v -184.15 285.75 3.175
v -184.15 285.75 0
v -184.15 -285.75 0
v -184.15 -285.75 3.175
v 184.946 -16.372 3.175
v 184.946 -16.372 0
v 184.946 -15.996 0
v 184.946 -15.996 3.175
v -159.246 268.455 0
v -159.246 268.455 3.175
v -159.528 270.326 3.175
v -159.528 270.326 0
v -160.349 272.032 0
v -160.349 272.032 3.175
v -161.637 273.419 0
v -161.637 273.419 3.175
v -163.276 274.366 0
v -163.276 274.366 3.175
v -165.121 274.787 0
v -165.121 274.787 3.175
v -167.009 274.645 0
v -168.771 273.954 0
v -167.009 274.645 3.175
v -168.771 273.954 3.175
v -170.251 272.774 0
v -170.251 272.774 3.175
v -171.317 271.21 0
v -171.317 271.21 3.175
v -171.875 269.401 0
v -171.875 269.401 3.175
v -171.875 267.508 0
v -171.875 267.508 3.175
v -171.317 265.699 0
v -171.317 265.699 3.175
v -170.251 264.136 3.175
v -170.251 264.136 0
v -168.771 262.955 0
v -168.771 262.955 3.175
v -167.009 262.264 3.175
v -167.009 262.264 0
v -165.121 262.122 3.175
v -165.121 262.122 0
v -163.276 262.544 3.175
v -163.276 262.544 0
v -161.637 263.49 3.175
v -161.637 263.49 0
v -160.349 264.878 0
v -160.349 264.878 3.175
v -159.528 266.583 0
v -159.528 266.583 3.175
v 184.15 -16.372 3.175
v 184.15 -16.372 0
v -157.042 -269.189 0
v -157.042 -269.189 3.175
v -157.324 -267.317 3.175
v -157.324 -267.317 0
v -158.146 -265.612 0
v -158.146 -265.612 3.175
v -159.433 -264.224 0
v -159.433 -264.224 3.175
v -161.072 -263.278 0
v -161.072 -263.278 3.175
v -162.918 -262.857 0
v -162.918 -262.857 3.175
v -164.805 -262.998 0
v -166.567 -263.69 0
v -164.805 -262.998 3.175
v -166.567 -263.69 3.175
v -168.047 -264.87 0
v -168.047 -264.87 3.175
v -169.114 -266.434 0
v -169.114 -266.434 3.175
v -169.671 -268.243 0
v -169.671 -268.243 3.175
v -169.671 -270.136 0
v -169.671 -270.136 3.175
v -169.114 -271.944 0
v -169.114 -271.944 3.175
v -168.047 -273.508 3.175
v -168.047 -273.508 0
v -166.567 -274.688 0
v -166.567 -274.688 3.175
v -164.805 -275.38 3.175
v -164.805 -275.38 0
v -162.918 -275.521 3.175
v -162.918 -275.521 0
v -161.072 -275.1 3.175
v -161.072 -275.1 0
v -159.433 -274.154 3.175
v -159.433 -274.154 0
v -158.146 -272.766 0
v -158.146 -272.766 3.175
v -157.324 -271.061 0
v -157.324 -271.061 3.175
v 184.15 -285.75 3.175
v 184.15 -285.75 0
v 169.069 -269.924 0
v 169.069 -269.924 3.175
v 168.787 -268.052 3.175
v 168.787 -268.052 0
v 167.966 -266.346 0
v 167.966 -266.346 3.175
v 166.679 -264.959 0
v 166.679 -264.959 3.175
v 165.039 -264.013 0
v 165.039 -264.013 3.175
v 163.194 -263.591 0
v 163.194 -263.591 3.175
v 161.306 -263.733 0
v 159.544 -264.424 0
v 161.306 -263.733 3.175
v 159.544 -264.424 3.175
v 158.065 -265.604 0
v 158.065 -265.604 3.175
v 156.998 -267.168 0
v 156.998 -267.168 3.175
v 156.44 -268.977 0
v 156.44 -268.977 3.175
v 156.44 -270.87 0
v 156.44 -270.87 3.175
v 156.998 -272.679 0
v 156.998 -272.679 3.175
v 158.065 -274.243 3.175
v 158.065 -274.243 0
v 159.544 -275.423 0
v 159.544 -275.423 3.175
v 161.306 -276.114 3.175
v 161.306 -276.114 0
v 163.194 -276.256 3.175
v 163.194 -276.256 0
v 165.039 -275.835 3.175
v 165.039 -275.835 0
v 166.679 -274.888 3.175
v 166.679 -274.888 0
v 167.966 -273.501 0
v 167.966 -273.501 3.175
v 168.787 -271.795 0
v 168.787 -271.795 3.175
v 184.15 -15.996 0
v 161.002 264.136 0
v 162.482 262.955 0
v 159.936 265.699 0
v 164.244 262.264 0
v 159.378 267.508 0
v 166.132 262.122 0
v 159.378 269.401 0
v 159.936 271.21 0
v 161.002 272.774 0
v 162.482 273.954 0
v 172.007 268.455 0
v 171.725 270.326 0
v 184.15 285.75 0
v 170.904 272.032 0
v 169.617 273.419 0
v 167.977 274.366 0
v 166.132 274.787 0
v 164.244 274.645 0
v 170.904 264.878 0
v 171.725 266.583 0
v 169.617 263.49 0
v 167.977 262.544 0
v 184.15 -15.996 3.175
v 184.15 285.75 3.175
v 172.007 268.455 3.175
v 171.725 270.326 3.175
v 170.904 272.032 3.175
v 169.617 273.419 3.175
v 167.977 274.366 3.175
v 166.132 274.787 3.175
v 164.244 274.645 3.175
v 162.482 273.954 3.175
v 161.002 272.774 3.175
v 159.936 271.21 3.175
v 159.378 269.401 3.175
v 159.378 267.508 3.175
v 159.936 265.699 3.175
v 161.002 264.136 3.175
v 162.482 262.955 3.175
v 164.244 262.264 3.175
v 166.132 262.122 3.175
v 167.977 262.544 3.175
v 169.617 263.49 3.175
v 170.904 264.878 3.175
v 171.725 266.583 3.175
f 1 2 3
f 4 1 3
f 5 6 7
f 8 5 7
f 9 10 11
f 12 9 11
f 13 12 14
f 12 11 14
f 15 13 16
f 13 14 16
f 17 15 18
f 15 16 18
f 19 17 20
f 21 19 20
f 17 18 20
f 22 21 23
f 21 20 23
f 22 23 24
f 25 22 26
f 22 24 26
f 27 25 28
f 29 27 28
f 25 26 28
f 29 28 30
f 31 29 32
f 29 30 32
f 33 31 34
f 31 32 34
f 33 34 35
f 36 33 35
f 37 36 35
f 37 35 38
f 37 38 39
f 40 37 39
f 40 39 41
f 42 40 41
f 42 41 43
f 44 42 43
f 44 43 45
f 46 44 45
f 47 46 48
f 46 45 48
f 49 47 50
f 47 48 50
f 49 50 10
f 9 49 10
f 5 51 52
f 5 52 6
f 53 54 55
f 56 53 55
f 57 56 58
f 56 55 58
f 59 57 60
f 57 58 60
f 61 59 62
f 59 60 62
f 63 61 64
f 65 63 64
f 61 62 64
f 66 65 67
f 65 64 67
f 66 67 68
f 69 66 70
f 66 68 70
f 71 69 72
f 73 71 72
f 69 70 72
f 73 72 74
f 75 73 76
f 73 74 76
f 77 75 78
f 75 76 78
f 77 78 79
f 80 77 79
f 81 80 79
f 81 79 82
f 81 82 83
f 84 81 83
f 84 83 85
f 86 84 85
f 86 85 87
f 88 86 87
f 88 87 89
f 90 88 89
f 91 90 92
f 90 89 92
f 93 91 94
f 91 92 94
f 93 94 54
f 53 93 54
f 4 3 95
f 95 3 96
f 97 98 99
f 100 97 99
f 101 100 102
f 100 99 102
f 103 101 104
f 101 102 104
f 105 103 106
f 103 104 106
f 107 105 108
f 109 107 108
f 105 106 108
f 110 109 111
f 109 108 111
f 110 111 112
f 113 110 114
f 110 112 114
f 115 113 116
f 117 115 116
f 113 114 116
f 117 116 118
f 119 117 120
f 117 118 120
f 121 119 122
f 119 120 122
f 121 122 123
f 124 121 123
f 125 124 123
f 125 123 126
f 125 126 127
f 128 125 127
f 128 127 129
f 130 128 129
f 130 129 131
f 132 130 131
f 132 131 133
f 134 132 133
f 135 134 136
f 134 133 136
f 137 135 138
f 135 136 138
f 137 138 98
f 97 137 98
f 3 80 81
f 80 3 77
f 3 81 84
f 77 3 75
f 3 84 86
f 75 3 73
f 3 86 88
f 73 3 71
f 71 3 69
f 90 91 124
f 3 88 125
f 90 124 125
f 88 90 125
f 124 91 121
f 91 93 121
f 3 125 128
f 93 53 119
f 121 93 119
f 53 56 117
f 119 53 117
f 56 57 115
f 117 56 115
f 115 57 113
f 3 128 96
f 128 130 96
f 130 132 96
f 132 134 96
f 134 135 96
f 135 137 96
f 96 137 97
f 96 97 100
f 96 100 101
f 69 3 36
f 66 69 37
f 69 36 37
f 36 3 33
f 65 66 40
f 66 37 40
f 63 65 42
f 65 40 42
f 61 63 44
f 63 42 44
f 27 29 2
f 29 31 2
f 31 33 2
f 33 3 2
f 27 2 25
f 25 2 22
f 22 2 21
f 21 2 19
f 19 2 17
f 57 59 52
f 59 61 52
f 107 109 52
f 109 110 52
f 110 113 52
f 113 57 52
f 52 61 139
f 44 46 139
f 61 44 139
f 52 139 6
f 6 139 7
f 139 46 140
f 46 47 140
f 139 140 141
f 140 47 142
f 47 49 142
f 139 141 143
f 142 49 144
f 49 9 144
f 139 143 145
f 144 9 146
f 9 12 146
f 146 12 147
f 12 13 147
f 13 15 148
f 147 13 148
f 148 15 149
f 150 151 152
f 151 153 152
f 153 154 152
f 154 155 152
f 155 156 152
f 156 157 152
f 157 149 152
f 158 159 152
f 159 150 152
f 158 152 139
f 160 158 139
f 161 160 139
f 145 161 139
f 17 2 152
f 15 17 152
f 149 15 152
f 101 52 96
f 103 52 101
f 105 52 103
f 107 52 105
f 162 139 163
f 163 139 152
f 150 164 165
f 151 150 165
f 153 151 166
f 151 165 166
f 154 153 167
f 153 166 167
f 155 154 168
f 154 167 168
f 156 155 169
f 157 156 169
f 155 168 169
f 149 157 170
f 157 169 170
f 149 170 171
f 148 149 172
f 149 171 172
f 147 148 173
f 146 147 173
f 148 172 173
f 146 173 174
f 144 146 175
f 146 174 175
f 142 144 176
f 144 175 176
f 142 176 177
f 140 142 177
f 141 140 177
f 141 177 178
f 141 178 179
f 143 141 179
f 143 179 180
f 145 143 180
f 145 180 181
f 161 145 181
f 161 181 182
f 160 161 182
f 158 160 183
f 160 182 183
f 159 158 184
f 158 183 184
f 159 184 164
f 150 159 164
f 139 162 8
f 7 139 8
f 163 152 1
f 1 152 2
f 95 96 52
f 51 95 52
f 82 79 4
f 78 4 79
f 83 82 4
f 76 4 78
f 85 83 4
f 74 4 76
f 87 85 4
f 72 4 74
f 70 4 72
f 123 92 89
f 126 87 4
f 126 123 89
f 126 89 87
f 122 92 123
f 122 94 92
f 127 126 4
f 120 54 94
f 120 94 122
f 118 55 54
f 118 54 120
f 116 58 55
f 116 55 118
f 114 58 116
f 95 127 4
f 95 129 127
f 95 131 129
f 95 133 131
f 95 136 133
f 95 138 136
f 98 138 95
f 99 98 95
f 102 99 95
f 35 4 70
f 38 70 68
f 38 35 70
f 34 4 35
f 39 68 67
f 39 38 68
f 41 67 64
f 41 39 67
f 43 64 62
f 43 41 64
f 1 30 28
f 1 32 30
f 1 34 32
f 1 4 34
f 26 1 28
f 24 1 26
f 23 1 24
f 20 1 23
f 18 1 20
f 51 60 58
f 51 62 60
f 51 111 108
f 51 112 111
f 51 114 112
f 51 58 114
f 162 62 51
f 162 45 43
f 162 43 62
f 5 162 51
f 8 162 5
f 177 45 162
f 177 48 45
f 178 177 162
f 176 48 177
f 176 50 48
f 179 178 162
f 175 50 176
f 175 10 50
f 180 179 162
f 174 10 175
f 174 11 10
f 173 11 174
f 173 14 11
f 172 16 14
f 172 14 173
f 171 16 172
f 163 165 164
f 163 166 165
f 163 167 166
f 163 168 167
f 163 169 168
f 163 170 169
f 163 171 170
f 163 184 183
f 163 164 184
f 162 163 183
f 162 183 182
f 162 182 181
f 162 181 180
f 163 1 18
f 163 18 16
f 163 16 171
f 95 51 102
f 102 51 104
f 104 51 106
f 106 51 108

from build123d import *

# Parameters (mm, degrees)
F0_W     = 0.795994738
F0_H     = 0.3761083686
F1_DEPTH = 3.175
F2_R     = 6.35
F3_DEPTH = 3.175


with BuildPart() as f1:
    # F0 (on Top) → F1 (new body)
    with BuildSketch(Plane.XY):
        Polygon((184.15, -15.9963709149), (184.15, 285.75), (-184.15, 285.75), (-184.15, -285.75), (184.15, -285.75), (184.15, -16.3724792835), (183.354005262, -16.3724792835), (183.354005262, -15.9963709149), align=None)
        with Locations((184.547997369, -16.1844250992)):
            Rectangle(F0_W, F0_H)
        with Locations((183.752002631, -16.1844250992)):
            Rectangle(F0_W, F0_H)
    extrude(amount=F1_DEPTH)

    # F2 (on face) → F3 (cut)
    with BuildSketch(Plane.XY.offset(3.175)):
        with Locations((-165.5958145857, 268.4546113014)):
            Circle(F2_R)
        with Locations((165.6573414803, 268.4546113014)):
            Circle(F2_R)
        with Locations((-163.3923649788, -269.1890895367)):
            Circle(F2_R)
        with Locations((162.7193838358, -269.9235677719)):
            Circle(F2_R)
    extrude(amount=-F3_DEPTH, mode=Mode.SUBTRACT)


solid = f1.part
